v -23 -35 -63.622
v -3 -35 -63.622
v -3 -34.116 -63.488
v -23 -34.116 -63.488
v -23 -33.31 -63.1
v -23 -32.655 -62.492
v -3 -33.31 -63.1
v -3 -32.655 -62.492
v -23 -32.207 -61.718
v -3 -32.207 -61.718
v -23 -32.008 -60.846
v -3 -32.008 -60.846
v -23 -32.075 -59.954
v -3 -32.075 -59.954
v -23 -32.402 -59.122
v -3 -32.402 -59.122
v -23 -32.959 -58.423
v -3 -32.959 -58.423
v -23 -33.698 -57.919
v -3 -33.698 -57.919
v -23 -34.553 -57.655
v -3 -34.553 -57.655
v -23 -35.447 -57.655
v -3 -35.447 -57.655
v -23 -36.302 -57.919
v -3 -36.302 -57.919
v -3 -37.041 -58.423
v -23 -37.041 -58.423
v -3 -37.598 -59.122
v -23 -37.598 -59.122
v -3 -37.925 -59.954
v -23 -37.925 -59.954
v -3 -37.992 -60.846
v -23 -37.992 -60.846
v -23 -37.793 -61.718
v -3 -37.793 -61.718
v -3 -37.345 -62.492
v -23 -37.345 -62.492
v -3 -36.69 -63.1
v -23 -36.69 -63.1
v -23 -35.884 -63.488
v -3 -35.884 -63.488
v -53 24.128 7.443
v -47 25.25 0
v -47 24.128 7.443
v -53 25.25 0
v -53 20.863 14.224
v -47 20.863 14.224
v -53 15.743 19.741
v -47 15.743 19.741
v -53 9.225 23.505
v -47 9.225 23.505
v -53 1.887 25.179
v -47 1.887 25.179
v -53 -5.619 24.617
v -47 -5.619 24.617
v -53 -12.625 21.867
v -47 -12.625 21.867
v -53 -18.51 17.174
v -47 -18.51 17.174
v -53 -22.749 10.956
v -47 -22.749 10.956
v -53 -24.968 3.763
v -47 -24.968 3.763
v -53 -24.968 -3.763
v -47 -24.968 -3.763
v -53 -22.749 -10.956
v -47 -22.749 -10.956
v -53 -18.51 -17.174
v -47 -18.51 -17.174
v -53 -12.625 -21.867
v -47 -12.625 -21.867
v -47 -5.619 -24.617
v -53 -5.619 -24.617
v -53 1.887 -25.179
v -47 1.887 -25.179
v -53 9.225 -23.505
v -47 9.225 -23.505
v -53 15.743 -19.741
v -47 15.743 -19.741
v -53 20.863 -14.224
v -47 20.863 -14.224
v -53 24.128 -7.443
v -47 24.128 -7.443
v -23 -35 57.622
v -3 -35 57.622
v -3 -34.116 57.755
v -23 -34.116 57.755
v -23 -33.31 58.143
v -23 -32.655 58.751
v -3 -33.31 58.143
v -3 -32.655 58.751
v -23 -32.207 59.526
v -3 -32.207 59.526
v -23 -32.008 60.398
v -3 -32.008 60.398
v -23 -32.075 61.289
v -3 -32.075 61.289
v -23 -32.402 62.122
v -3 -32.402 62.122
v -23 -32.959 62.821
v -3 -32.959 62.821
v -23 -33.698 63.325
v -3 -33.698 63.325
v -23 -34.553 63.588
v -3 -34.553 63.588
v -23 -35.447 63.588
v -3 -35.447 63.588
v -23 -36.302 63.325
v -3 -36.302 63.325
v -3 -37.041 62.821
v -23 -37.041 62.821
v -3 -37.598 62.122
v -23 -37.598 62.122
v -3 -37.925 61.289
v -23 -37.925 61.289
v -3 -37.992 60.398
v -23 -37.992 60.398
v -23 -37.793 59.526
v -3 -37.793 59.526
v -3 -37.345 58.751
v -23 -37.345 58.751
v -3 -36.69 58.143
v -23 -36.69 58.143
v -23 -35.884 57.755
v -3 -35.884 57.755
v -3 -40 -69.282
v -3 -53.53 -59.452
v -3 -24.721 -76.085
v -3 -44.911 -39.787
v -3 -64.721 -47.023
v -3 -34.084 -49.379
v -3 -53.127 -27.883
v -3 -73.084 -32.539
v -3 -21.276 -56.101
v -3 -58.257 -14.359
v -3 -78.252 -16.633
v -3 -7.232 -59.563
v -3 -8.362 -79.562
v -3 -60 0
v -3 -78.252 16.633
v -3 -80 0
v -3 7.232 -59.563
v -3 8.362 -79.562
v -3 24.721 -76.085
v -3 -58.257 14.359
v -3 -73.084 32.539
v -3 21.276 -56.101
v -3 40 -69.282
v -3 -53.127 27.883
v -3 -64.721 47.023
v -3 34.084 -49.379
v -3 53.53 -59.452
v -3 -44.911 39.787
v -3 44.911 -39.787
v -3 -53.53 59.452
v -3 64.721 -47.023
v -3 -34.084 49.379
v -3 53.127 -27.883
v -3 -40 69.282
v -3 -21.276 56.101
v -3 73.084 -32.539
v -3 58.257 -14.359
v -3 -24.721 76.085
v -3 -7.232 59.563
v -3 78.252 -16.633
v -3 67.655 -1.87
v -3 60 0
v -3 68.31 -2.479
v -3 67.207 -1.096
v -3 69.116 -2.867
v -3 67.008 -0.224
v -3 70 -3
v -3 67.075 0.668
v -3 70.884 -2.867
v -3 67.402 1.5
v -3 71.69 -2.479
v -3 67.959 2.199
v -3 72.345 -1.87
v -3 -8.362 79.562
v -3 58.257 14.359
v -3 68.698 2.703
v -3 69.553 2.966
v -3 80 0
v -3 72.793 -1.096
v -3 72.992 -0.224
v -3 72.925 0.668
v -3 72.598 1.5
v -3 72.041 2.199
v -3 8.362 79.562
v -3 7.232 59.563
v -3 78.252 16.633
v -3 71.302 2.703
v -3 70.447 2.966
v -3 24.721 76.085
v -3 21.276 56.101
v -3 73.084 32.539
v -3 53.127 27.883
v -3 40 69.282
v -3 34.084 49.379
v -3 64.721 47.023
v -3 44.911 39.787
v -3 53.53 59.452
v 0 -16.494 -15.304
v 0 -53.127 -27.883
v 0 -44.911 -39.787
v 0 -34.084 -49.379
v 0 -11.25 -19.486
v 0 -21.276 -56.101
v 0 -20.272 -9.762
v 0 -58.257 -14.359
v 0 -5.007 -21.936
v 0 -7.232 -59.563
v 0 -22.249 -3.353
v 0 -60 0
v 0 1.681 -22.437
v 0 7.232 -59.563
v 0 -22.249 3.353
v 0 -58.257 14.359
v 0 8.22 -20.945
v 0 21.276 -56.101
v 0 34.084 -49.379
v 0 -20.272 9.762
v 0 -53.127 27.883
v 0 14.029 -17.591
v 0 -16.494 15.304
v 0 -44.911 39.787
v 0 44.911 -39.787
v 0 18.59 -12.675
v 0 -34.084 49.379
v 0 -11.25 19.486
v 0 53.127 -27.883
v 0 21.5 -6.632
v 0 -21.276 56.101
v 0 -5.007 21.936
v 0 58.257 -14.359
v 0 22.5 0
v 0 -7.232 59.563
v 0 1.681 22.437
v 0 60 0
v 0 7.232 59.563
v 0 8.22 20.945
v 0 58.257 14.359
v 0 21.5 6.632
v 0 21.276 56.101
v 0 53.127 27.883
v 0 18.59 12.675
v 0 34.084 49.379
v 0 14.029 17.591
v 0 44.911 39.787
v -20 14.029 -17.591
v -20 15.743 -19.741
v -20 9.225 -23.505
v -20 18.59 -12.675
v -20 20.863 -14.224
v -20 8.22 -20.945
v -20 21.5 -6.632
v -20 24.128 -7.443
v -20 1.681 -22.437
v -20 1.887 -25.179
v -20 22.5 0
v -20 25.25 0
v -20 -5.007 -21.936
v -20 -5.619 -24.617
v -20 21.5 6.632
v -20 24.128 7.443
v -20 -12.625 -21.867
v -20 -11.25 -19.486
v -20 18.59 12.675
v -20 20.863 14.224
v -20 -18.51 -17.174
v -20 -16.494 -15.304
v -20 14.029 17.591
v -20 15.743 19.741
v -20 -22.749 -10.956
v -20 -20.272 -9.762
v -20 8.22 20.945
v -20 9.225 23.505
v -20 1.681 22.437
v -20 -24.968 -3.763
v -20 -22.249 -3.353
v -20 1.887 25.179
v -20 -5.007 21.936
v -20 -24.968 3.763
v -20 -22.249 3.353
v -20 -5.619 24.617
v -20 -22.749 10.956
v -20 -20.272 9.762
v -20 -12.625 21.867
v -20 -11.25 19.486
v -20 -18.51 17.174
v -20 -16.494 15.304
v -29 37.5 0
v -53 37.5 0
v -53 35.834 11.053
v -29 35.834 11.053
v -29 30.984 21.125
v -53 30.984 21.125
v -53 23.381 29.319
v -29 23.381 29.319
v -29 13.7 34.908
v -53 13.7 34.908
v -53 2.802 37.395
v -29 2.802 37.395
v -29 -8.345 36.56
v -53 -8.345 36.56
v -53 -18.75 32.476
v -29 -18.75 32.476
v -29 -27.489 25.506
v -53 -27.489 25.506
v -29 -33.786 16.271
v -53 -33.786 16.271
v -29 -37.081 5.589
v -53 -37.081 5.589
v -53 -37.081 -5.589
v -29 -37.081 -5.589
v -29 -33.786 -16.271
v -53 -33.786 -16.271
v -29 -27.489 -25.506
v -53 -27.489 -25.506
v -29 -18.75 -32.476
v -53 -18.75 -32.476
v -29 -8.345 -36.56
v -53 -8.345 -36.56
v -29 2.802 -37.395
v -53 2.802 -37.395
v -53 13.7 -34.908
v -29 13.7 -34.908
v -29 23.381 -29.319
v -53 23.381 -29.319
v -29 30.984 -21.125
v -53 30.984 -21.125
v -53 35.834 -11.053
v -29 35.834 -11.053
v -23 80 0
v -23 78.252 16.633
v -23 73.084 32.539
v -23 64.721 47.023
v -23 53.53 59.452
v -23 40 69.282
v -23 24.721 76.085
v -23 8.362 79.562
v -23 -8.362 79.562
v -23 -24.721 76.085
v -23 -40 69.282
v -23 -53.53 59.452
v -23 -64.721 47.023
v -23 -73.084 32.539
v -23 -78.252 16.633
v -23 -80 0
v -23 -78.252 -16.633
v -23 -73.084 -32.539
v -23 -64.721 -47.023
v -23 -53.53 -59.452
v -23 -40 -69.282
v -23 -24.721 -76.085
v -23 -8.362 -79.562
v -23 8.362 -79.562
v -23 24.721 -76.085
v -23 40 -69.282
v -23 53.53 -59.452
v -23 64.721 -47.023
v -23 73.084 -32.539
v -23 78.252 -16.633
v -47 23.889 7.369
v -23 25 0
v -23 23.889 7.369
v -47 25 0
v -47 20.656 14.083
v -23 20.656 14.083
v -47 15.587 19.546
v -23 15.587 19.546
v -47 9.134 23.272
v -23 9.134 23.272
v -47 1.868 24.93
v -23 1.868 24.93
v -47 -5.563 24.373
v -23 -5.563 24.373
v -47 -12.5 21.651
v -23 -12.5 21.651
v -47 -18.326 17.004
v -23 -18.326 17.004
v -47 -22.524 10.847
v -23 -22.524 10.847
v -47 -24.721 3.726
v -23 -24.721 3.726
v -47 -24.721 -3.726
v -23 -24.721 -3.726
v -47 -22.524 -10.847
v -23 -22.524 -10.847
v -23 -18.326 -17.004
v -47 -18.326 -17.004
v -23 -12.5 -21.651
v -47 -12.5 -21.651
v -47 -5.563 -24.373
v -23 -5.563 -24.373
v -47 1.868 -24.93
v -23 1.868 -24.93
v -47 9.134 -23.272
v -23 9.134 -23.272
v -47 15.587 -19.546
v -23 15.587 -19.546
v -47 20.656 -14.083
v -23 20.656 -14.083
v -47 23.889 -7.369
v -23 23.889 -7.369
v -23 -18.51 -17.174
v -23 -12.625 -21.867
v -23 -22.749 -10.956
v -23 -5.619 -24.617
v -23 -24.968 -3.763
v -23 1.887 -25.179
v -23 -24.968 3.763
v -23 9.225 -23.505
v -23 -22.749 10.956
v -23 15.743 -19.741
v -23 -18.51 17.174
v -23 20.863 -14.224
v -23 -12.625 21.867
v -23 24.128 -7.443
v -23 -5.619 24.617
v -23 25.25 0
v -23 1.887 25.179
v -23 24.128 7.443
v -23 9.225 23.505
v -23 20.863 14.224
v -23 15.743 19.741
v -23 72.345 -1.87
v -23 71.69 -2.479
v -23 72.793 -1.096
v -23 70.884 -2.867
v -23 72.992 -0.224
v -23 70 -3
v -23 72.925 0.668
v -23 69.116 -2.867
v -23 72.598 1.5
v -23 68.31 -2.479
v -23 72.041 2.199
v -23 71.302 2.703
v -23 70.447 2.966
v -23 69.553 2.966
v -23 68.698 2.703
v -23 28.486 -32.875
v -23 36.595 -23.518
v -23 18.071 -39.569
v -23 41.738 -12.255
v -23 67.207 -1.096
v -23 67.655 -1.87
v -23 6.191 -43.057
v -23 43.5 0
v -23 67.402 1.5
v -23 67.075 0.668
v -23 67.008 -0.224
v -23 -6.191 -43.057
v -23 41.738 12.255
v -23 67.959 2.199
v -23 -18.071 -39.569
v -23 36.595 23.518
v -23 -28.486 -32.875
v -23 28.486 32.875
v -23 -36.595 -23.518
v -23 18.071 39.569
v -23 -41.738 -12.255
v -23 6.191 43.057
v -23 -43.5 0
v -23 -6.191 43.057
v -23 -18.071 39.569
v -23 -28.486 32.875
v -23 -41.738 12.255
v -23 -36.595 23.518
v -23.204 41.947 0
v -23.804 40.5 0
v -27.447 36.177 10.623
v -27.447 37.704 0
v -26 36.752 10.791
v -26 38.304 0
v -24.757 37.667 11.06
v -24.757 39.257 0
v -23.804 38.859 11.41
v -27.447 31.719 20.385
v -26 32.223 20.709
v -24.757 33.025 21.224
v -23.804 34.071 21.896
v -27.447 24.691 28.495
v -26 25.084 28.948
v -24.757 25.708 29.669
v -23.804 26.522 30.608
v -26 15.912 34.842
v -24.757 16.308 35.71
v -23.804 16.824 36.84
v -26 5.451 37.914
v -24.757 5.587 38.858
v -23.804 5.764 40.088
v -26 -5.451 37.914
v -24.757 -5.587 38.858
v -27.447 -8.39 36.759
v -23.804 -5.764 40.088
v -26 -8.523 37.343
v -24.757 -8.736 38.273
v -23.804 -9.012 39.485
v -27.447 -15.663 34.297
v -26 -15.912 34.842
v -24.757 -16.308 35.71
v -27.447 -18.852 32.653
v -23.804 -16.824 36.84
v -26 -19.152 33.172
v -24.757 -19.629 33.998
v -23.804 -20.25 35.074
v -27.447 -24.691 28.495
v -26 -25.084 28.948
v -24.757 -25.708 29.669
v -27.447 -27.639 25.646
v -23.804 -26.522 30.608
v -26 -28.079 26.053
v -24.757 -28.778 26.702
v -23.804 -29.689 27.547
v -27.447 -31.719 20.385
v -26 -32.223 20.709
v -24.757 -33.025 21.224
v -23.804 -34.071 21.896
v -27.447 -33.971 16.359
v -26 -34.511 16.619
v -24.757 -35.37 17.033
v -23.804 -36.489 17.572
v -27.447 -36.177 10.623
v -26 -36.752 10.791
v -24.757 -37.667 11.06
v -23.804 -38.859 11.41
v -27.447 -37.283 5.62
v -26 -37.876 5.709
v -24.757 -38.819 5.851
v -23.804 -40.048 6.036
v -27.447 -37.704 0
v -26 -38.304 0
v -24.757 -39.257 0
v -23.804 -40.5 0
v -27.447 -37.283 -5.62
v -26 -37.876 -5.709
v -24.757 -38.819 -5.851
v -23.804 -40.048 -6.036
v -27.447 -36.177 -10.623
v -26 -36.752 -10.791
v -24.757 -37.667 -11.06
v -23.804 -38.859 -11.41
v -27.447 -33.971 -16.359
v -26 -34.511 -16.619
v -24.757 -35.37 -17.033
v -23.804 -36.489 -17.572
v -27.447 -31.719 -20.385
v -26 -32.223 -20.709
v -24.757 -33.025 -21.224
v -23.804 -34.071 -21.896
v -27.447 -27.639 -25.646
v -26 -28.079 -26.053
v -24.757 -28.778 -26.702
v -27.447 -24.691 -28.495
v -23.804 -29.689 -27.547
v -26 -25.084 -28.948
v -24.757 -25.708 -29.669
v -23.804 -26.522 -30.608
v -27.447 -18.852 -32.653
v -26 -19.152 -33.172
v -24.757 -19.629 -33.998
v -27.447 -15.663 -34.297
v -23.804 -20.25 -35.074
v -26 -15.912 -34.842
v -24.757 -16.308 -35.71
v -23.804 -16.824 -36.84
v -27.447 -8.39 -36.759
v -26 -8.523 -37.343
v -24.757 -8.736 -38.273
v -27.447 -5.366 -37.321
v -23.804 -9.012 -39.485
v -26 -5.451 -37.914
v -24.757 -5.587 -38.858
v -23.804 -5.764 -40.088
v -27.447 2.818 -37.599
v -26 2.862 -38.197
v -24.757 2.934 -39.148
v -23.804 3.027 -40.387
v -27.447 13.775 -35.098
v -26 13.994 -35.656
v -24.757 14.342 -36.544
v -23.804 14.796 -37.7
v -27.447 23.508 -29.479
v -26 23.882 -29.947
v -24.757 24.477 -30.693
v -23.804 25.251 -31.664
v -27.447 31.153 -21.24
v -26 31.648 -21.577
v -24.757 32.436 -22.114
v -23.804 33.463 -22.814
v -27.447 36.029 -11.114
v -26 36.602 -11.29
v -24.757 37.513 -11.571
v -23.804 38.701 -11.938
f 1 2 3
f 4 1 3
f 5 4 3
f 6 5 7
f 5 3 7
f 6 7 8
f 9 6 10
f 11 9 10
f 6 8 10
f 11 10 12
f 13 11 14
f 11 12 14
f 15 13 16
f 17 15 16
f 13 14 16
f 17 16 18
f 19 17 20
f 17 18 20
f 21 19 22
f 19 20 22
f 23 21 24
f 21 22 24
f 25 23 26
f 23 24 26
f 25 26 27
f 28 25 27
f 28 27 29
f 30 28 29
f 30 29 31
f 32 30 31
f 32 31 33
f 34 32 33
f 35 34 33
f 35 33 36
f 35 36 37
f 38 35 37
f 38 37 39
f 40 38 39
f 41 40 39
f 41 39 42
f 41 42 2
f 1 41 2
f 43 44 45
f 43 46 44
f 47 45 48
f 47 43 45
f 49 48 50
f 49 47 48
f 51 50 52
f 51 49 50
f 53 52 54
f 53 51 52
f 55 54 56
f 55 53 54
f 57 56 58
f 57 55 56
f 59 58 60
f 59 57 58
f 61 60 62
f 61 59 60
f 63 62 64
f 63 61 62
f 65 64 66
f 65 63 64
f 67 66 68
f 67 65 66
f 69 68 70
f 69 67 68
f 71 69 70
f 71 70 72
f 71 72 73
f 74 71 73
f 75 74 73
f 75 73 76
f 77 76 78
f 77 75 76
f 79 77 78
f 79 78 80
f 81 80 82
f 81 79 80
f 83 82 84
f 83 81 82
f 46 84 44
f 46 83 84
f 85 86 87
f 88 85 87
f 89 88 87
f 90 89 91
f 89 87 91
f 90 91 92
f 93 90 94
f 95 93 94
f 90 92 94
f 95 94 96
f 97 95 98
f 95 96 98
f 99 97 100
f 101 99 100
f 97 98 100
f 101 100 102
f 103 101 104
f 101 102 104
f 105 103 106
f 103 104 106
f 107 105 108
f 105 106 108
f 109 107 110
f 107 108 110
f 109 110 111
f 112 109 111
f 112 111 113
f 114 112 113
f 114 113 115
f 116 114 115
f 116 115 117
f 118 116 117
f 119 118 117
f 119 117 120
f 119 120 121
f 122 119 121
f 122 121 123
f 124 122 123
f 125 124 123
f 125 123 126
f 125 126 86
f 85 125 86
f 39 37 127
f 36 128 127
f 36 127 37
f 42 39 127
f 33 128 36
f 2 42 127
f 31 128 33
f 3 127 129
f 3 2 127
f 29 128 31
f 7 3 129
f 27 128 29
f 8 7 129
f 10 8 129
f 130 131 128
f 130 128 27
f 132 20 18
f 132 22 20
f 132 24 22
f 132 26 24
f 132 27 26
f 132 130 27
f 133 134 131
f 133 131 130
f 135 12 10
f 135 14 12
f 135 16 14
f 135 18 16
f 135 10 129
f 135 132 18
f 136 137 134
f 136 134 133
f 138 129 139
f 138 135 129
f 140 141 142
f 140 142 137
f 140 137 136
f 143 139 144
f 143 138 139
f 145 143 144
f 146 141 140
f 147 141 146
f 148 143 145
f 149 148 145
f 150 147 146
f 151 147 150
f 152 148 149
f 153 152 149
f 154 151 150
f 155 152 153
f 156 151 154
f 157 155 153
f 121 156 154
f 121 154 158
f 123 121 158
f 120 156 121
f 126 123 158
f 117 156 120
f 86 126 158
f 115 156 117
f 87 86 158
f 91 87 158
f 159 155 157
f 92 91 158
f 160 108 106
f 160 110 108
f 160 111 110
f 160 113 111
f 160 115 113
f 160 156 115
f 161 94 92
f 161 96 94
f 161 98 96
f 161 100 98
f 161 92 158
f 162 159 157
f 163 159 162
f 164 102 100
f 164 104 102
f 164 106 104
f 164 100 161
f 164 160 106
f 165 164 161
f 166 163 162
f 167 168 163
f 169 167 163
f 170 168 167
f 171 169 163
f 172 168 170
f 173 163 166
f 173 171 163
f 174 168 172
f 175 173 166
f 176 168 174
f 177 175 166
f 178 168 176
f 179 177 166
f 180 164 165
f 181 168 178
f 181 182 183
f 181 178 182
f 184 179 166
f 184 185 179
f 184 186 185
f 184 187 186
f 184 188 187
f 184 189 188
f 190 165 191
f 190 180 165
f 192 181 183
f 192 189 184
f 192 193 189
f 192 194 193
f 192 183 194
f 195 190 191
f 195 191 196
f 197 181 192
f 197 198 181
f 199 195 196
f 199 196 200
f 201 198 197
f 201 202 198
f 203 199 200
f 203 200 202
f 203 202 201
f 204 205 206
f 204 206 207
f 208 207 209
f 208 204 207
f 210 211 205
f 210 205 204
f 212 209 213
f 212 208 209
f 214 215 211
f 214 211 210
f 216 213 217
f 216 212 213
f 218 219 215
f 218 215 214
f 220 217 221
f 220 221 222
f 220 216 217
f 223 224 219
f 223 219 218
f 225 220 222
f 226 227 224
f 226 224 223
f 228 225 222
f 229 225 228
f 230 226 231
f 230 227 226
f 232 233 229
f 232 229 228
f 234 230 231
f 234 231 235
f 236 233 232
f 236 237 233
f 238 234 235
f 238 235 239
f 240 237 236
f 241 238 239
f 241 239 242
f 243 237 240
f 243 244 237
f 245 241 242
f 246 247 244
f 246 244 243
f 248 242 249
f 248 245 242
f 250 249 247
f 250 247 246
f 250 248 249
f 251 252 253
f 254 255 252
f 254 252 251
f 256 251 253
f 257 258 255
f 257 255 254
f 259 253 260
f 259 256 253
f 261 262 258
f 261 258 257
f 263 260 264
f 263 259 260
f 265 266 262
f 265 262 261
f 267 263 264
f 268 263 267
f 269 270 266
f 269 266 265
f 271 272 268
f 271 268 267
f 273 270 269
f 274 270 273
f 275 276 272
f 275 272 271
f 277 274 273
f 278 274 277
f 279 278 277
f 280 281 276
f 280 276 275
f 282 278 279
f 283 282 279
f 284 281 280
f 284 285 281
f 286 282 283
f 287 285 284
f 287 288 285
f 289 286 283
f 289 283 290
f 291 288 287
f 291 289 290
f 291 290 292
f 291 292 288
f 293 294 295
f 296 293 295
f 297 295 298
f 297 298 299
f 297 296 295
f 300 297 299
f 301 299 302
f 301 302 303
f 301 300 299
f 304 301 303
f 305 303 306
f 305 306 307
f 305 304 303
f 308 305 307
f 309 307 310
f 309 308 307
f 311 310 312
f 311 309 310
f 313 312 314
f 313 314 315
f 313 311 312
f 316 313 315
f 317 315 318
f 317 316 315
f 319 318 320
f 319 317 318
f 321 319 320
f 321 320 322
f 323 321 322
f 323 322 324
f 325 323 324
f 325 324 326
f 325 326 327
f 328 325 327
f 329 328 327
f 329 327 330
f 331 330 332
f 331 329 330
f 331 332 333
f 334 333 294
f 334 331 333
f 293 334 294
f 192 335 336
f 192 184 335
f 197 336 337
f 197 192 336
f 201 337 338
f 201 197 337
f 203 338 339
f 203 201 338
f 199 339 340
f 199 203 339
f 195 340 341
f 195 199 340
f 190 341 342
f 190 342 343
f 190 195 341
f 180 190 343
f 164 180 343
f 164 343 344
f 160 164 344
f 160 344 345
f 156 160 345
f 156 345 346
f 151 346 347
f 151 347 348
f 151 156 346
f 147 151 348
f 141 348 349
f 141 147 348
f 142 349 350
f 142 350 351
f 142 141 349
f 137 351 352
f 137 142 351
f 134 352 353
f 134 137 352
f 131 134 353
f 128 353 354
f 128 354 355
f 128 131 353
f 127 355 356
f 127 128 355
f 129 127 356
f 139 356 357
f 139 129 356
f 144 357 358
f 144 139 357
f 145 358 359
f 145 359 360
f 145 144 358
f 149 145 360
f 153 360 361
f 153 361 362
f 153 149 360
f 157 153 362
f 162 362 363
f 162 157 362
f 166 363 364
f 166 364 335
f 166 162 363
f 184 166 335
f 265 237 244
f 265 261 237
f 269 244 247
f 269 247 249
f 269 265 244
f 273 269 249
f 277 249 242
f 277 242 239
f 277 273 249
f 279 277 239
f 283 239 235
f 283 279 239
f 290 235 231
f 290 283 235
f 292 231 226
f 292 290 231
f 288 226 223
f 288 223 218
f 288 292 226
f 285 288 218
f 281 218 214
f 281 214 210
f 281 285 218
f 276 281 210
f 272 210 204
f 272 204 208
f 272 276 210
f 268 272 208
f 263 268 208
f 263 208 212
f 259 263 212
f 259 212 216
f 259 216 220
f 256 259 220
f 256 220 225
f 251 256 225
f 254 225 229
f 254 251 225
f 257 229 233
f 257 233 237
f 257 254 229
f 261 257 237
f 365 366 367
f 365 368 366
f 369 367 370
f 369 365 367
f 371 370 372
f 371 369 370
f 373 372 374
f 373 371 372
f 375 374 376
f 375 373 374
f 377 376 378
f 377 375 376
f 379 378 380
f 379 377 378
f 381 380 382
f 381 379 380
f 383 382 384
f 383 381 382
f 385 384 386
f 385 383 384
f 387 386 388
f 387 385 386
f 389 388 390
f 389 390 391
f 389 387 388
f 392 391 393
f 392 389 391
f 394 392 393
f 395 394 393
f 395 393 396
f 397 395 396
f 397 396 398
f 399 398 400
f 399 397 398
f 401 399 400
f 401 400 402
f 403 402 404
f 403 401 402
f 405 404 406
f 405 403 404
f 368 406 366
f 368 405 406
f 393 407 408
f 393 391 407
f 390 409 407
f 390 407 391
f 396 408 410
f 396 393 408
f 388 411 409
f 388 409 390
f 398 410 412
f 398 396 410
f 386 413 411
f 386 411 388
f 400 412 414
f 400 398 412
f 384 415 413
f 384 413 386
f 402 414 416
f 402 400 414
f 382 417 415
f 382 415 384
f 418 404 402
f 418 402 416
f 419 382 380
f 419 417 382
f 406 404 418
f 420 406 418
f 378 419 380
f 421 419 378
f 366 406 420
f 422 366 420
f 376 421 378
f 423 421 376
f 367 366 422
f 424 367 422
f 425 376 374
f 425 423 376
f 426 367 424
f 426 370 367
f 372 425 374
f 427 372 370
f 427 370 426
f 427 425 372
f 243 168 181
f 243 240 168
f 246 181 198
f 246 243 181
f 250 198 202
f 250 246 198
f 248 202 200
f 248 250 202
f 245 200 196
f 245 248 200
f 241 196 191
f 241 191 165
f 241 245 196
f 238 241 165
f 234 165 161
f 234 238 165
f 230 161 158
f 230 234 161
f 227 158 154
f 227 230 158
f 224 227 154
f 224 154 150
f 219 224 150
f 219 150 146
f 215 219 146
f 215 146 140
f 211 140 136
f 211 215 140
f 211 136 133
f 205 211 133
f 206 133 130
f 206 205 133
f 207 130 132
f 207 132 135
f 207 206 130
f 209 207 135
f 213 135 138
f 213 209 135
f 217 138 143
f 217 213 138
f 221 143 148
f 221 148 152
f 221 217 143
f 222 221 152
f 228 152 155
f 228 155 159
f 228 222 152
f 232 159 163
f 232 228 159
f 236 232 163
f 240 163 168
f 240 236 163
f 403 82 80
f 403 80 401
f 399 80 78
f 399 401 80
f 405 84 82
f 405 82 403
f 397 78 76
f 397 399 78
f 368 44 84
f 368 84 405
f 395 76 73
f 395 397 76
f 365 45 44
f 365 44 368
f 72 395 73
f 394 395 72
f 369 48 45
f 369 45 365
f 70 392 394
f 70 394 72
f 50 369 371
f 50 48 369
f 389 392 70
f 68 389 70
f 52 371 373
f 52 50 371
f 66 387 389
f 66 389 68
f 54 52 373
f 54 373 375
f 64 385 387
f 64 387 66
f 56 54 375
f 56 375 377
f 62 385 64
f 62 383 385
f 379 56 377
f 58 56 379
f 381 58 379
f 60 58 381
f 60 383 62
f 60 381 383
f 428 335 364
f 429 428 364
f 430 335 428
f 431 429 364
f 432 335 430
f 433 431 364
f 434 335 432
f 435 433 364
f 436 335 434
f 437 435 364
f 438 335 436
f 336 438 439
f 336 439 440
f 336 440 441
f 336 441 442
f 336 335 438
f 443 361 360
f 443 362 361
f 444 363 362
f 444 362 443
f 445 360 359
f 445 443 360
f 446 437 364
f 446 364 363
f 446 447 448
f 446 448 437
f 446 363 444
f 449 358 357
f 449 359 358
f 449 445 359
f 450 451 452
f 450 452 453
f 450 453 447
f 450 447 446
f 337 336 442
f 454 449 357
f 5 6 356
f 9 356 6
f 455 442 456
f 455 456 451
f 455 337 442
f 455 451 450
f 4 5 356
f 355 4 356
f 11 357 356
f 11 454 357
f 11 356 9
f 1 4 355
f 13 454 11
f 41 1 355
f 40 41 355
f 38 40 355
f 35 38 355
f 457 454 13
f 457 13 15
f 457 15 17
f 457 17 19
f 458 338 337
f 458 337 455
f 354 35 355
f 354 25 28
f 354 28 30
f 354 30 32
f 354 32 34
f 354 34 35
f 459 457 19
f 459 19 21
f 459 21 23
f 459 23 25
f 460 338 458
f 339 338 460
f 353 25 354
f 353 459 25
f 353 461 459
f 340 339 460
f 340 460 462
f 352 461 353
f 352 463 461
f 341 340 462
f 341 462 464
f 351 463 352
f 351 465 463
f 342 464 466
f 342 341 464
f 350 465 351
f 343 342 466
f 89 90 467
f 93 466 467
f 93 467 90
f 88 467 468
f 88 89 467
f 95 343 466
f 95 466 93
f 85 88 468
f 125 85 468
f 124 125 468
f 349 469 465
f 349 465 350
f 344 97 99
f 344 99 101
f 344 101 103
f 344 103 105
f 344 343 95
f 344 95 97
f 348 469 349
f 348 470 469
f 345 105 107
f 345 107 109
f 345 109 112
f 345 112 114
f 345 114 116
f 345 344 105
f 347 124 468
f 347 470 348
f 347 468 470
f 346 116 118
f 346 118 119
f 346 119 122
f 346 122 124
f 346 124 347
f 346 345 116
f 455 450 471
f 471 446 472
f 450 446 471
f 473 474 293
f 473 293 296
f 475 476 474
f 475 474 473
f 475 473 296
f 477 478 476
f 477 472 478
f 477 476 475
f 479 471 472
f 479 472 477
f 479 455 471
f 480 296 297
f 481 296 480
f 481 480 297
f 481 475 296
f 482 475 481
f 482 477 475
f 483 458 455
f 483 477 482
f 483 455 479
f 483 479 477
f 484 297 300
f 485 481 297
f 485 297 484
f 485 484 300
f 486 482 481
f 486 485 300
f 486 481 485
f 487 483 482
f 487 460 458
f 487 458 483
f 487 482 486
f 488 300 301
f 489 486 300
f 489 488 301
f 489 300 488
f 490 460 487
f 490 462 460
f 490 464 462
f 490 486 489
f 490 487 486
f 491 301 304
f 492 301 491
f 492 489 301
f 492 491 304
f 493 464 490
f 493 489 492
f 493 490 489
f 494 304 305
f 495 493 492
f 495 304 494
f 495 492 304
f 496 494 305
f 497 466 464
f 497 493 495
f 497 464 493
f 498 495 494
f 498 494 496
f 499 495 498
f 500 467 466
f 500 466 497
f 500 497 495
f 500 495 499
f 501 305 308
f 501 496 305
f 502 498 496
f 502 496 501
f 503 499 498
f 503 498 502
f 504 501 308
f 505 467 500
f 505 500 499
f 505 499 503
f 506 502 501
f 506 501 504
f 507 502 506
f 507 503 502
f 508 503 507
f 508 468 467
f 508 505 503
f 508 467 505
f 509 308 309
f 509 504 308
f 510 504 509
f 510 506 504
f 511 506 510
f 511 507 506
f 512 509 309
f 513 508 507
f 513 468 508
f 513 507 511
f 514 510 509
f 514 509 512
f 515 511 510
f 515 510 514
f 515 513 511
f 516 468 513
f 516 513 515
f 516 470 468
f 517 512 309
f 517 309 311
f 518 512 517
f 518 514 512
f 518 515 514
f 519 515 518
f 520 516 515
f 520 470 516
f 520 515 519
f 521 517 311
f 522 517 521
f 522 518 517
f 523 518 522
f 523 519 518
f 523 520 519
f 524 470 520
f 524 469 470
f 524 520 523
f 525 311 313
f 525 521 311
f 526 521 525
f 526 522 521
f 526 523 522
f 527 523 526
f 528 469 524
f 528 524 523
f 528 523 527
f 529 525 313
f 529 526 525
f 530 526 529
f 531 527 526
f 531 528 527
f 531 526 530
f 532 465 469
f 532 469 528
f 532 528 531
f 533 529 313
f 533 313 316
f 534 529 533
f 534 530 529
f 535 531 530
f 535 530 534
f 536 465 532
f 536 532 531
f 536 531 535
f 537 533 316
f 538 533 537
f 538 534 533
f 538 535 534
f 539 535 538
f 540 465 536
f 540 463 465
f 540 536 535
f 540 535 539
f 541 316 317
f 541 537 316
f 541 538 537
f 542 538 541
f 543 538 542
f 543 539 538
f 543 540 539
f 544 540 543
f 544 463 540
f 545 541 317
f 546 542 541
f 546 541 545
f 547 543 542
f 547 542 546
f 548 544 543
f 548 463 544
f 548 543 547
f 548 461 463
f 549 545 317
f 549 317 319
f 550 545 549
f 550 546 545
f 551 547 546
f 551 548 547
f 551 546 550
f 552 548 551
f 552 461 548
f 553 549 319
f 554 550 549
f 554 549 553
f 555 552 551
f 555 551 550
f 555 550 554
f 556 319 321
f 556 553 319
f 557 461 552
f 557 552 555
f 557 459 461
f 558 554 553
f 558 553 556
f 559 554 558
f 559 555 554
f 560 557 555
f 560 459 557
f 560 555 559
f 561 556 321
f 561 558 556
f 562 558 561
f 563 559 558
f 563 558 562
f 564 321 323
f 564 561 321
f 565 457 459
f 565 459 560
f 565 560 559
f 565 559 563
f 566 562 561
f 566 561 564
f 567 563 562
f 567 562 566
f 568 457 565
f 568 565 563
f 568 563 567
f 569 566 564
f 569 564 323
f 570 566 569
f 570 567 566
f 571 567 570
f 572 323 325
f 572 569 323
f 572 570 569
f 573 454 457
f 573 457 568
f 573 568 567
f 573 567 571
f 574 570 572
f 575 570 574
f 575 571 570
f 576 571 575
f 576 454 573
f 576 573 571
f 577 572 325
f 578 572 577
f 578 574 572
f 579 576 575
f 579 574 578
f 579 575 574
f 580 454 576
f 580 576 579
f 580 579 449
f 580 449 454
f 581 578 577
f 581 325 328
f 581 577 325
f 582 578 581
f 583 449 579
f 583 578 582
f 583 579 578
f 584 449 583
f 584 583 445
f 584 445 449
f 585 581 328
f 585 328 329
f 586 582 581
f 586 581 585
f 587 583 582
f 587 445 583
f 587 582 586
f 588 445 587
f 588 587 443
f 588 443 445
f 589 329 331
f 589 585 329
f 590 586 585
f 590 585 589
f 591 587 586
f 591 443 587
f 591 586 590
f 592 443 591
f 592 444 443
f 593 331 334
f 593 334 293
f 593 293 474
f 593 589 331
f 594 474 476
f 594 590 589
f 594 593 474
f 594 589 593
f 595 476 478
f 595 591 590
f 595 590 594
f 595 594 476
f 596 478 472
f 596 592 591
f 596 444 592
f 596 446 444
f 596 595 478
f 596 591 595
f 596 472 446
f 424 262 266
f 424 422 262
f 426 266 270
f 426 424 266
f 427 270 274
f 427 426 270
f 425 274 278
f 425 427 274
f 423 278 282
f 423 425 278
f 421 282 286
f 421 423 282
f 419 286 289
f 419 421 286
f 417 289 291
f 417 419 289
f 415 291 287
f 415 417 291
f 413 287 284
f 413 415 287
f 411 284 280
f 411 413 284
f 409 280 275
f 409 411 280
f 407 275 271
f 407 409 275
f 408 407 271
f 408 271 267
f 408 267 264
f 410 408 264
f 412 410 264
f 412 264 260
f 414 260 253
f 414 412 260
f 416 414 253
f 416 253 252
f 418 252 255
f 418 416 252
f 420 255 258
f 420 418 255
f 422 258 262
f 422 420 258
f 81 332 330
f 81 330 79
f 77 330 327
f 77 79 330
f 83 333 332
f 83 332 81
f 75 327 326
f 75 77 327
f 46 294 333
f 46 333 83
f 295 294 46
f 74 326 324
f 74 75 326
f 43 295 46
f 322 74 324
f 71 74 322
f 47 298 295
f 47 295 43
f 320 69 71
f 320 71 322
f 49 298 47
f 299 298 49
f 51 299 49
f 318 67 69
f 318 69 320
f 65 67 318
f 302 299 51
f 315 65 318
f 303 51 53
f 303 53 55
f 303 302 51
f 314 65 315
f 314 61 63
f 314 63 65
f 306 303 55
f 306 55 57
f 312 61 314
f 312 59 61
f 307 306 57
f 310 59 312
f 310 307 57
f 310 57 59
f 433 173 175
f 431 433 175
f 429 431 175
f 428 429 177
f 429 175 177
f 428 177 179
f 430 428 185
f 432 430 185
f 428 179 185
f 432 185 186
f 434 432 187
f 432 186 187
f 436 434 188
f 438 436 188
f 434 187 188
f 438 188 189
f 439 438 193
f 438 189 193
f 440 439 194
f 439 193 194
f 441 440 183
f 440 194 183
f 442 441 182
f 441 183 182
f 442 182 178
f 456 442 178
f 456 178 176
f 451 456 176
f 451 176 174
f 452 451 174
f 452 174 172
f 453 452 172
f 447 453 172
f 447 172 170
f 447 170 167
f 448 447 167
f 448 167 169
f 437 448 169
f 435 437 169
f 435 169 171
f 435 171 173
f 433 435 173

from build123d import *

# Parameters (mm, degrees)
FILLET1_R          = 6
SKETCH2_R          = 3
CUT_EXTRUDE1_DEPTH = 51


with BuildPart() as part:
    # Sketch1 → Revolve1 (revolve)
    with BuildSketch(Plane.XY):
        Polygon((0, 22.5), (-20, 22.5), (-20, 25.25), (-23, 25.25), (-23, 25), (-47, 25), (-47, 25.25), (-53, 25.25), (-53, 37.5), (-23, 37.5), (-23, 80), (-3, 80), (-3, 60), (0, 60), align=None)
    revolve(axis=Axis((-1000, 0, 0), (1, 0, 0)))

    # Fillet1
    fillet1_edges = [part.edges().sort_by_distance(p)[0] for p in [
        (-23, -37.5, 0),
    ]]
    fillet(fillet1_edges, radius=FILLET1_R)

    # Sketch2 → Cut-Extrude1 (cut, through all)
    with BuildSketch(Plane(origin=(-3, 0, 0), x_dir=(0, 0, -1), z_dir=(1, 0, 0))):
        with Locations((0, 70)):
            Circle(SKETCH2_R)
        with Locations((60.621778265, -35)):
            Circle(SKETCH2_R)
        with Locations((-60.621778265, -35)):
            Circle(SKETCH2_R)
    extrude(amount=-CUT_EXTRUDE1_DEPTH, mode=Mode.SUBTRACT)


solid = part.part
